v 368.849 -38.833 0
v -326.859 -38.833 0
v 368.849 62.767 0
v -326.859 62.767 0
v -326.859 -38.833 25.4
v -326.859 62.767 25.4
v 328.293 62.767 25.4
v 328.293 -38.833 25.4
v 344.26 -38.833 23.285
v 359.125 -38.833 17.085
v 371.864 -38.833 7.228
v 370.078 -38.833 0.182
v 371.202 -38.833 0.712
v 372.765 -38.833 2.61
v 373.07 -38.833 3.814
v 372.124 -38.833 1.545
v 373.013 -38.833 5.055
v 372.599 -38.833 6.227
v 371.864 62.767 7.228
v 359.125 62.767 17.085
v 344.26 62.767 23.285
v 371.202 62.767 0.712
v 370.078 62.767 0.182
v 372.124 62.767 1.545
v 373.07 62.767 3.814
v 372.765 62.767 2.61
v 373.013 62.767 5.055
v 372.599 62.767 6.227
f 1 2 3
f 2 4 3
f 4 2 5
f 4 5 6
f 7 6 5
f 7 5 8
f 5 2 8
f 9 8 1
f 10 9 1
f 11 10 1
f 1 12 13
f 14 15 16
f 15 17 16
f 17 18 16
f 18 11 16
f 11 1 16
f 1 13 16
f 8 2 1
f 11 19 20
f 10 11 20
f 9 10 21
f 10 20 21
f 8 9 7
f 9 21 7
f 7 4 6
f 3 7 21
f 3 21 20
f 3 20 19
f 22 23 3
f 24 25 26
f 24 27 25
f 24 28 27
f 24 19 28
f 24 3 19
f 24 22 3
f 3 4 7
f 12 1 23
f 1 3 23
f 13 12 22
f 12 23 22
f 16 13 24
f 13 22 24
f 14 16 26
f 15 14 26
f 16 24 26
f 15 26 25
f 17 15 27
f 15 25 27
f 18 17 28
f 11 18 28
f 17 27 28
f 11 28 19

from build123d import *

# Parameters (mm, degrees)
F0_W        = 704.85
F0_H        = 101.6
F1_DEPTH    = 25.4
F2_T1_DEPTH = 350.0928592435
F3_R        = 4.2426380505


# Not quite as in the source:
# - a fillet or chamfer that OpenCascade refuses, or shapes differently, is made with other operations: its cross-section is extruded or revolved along the edge and cut away or added


with BuildPart() as f1:
    # F0 (on Top) → F1 (new body)
    with BuildSketch(Plane.XY):
        with Locations((25.5663767457, 11.9668386396)):
            Rectangle(F0_W, F0_H)
    extrude(amount=F1_DEPTH)

    # F2: fillet of radius 61.3210244843 on 1 edges, made by hand

    # F2_s2 → F2_t1 (cut)
    with BuildSketch(Plane.XZ.offset(-187.0132682614)):
        with BuildLine():
            ThreePointArc((377.9913767457, 0), (356.1993813791, 18.6820068679), (328.292804897, 25.4))
            Line((328.292804897, 25.4), (377.9913767457, 25.4))
            Line((377.9913767457, 25.4), (377.9913767457, 0))
        make_face()
    extrude(amount=F2_T1_DEPTH, mode=Mode.SUBTRACT)

    # F3
    f3_edges = [f1.edges().sort_by_distance(p)[0] for p in [
        (377.991377, 11.966839, 0),
    ]]
    fillet(f3_edges, radius=F3_R)


solid = f1.part
